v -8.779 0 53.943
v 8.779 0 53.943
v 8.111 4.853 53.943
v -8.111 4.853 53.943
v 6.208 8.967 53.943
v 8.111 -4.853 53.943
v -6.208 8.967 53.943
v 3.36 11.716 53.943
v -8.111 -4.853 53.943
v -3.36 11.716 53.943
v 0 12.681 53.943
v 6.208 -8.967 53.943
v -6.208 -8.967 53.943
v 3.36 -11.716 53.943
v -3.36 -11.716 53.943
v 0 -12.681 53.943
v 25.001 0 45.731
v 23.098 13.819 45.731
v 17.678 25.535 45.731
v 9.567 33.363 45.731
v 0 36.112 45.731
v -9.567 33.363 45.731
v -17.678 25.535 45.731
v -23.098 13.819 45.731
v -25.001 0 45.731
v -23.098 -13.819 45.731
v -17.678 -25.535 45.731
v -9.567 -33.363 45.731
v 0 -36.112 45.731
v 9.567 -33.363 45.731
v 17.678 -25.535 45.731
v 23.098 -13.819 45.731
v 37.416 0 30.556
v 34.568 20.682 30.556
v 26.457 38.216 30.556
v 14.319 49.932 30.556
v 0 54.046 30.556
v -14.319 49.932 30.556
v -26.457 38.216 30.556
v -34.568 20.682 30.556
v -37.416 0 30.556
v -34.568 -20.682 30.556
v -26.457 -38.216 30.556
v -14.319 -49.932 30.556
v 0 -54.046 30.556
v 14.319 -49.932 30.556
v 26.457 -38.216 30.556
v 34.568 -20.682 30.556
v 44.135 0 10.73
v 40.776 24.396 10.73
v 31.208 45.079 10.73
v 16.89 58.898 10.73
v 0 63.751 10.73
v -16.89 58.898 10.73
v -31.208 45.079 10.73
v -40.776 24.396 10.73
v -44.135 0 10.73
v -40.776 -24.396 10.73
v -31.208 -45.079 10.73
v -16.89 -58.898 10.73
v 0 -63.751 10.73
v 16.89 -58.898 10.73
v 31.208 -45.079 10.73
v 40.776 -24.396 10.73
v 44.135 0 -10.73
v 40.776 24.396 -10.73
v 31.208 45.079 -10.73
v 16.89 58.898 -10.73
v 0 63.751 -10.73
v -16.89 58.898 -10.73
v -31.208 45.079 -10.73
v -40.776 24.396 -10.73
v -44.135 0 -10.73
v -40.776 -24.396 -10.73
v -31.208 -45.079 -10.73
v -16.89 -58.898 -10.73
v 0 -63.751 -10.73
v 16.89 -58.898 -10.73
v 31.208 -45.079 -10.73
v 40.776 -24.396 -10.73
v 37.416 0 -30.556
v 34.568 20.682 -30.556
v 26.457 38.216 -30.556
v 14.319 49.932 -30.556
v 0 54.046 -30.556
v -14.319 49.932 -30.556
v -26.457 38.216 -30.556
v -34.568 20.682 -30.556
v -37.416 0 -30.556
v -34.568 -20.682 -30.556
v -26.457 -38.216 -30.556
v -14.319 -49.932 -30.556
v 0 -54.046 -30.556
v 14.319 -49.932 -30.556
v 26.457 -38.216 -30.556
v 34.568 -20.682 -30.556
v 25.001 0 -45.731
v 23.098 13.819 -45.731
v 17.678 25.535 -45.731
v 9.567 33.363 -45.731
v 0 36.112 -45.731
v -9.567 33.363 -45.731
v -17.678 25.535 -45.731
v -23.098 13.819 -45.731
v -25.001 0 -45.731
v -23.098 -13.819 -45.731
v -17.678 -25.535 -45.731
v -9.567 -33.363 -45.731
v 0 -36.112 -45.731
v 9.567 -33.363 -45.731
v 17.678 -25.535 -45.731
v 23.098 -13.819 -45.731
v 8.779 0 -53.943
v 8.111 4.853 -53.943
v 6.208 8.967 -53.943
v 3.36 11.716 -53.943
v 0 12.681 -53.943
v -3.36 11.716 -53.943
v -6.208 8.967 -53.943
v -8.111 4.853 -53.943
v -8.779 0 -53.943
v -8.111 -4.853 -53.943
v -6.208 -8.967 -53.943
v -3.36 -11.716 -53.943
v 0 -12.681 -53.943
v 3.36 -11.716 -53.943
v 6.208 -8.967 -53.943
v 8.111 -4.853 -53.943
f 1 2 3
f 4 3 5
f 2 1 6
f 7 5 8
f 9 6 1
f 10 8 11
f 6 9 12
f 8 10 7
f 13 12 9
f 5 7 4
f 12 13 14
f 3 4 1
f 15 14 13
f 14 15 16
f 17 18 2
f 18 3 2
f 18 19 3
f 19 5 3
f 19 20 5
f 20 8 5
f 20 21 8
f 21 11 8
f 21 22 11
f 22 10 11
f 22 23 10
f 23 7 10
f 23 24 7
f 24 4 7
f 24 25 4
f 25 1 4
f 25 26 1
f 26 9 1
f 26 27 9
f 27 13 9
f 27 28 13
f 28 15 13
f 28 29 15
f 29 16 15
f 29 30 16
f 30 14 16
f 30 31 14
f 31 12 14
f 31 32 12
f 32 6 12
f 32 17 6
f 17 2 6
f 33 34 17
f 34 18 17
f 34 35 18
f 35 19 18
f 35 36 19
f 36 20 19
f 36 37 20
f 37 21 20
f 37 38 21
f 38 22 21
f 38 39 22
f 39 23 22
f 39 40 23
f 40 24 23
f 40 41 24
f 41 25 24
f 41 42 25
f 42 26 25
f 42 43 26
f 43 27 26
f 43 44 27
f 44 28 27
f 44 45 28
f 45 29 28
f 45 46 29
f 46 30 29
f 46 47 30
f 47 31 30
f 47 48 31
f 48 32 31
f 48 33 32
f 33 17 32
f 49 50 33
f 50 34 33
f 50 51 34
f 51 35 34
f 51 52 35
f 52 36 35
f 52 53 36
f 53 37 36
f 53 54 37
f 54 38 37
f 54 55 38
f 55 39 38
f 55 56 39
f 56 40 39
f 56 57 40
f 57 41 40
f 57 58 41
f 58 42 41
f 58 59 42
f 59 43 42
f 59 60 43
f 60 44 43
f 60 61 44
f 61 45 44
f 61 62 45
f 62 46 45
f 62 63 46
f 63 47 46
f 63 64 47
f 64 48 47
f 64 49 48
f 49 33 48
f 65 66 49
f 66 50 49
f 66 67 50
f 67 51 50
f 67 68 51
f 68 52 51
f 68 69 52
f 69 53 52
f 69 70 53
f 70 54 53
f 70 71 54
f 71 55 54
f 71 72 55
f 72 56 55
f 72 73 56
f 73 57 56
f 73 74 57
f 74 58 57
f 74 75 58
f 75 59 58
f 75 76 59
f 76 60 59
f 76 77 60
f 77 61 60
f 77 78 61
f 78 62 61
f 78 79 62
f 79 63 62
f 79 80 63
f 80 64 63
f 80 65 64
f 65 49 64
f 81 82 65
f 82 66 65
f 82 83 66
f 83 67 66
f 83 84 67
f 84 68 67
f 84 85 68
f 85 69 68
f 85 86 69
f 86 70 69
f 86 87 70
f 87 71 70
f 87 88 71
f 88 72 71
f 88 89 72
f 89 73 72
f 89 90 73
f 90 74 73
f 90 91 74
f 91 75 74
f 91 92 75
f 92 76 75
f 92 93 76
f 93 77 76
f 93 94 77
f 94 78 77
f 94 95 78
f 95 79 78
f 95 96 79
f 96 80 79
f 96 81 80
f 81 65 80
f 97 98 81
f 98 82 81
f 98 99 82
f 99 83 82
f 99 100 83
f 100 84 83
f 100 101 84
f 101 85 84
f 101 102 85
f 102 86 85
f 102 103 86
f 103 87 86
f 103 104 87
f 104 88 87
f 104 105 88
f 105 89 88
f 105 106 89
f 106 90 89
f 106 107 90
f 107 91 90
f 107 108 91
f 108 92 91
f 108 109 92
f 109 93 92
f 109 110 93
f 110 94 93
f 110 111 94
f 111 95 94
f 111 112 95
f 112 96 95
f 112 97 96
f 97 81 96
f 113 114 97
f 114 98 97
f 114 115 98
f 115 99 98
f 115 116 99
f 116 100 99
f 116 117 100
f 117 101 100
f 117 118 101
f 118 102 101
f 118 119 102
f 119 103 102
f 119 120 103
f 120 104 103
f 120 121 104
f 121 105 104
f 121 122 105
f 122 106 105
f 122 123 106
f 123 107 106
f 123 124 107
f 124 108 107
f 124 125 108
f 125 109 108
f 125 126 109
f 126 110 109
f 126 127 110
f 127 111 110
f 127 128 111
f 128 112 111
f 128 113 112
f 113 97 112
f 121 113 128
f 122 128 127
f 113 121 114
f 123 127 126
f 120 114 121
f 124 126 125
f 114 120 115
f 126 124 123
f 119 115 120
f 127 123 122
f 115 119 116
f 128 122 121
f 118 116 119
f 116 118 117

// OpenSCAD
// Generated by SolidPython 1.0.1 on 2020-07-29 00:46:48


scale(v = [9, 13, 11]) {
	sphere(r = 5);
}
/***********************************************
*********      SolidPython code:      **********
************************************************
 
# import packages: SolidPython
from solid import *
from solid.utils import *
from itertools import chain, combinations, permutations


class Resize:

    def __init__(self, scad_file):
        self.scad_file = scad_file
        #self.scad_file = import_scad(scad_file)
        # cone/cylinder param:
        self.r1 = 0
        self.r2 = 0
        self.h = 0
        # rectangular prism param:
        self.w = 0
        self.l = 0
        # ellipse param:
        self.r = 0

    # import OpenScad code (file name corresponds to shape)


    # classify shape + parameters
    def assign(self, param1, param2, param3):
        if self.scad_file == 'cone.scad':
            self.r1 = param1
            self.r2 = param2
            self.h = param3
        elif self.scad_file == 'cylinder.scad':
            self.r1 = param1
            self.r2 = param2
            self.h = param3
        elif self.scad_file == 'rectangularPrism.scad':
            self.h = param1
            self.l = param2
            self.w = param3
        else:
            self.r = param1
            self.h = param2

    # resize parameters
    def iterate(self):
        x = range(3, 20, 2)
        i = 1
        if self.scad_file == 'cone.scad':
            tempList = list(permutations(x, 2))
            for temp in tempList:
                param1 = temp[0]
                param2 = temp[1]
                filepath = 'produced_scad_files/' + 'cone' + str(param1) + '_' + str(param2) + '_' + '.scad'
                scad_render_to_file(cylinder(h=param1, r1=param2, r2=0), filepath)

        elif self.scad_file == 'cylinder.scad':
            tempList = list(permutations(x, 3))
            for temp in tempList:
                param1 = temp[0]
                param2 = temp[1]
                filepath = 'produced_scad_files/' + 'cylinder' + str(param1) + '_' + str(param2) + '_' + '.scad'
                scad_render_to_file(cylinder(h=param1, r1=param2, r2=param2), filepath)

        elif self.scad_file == 'rectangularPrism.scad':
            tempList = list(permutations(x, 3))
            for temp in tempList:
                param1 = temp[0]
                param2 = temp[1]
                param3 = temp[2]
                filepath = 'produced_scad_files/' + 'rectangularPrism' + str(param1) + '_' + str(param2) + '_' + str(
                    param3) + '.scad'
                scad_render_to_file(cube(size=(param1, param2, param3)), filepath)

        elif self.scad_file == 'ellipse.scad':
            tempList = list(permutations(x, 4))
            for temp in tempList:
                param1 = temp[0]
                param2 = temp[1]
                param3 = temp[2]
                param4 = temp[3]
                filepath = 'produced_scad_files/' + 'ellipse' + str(param1) + '_' + str(param2) + '_' + str(param3) + '_' + str(param4) + '.scad'
                scad_render_to_file(scale([param1, param2, param3])(sphere(r=param4)), filepath)

    def render_to_scadfile(self):
        scad_render_to_file(scad, 'example.scad') 
 
************************************************/
